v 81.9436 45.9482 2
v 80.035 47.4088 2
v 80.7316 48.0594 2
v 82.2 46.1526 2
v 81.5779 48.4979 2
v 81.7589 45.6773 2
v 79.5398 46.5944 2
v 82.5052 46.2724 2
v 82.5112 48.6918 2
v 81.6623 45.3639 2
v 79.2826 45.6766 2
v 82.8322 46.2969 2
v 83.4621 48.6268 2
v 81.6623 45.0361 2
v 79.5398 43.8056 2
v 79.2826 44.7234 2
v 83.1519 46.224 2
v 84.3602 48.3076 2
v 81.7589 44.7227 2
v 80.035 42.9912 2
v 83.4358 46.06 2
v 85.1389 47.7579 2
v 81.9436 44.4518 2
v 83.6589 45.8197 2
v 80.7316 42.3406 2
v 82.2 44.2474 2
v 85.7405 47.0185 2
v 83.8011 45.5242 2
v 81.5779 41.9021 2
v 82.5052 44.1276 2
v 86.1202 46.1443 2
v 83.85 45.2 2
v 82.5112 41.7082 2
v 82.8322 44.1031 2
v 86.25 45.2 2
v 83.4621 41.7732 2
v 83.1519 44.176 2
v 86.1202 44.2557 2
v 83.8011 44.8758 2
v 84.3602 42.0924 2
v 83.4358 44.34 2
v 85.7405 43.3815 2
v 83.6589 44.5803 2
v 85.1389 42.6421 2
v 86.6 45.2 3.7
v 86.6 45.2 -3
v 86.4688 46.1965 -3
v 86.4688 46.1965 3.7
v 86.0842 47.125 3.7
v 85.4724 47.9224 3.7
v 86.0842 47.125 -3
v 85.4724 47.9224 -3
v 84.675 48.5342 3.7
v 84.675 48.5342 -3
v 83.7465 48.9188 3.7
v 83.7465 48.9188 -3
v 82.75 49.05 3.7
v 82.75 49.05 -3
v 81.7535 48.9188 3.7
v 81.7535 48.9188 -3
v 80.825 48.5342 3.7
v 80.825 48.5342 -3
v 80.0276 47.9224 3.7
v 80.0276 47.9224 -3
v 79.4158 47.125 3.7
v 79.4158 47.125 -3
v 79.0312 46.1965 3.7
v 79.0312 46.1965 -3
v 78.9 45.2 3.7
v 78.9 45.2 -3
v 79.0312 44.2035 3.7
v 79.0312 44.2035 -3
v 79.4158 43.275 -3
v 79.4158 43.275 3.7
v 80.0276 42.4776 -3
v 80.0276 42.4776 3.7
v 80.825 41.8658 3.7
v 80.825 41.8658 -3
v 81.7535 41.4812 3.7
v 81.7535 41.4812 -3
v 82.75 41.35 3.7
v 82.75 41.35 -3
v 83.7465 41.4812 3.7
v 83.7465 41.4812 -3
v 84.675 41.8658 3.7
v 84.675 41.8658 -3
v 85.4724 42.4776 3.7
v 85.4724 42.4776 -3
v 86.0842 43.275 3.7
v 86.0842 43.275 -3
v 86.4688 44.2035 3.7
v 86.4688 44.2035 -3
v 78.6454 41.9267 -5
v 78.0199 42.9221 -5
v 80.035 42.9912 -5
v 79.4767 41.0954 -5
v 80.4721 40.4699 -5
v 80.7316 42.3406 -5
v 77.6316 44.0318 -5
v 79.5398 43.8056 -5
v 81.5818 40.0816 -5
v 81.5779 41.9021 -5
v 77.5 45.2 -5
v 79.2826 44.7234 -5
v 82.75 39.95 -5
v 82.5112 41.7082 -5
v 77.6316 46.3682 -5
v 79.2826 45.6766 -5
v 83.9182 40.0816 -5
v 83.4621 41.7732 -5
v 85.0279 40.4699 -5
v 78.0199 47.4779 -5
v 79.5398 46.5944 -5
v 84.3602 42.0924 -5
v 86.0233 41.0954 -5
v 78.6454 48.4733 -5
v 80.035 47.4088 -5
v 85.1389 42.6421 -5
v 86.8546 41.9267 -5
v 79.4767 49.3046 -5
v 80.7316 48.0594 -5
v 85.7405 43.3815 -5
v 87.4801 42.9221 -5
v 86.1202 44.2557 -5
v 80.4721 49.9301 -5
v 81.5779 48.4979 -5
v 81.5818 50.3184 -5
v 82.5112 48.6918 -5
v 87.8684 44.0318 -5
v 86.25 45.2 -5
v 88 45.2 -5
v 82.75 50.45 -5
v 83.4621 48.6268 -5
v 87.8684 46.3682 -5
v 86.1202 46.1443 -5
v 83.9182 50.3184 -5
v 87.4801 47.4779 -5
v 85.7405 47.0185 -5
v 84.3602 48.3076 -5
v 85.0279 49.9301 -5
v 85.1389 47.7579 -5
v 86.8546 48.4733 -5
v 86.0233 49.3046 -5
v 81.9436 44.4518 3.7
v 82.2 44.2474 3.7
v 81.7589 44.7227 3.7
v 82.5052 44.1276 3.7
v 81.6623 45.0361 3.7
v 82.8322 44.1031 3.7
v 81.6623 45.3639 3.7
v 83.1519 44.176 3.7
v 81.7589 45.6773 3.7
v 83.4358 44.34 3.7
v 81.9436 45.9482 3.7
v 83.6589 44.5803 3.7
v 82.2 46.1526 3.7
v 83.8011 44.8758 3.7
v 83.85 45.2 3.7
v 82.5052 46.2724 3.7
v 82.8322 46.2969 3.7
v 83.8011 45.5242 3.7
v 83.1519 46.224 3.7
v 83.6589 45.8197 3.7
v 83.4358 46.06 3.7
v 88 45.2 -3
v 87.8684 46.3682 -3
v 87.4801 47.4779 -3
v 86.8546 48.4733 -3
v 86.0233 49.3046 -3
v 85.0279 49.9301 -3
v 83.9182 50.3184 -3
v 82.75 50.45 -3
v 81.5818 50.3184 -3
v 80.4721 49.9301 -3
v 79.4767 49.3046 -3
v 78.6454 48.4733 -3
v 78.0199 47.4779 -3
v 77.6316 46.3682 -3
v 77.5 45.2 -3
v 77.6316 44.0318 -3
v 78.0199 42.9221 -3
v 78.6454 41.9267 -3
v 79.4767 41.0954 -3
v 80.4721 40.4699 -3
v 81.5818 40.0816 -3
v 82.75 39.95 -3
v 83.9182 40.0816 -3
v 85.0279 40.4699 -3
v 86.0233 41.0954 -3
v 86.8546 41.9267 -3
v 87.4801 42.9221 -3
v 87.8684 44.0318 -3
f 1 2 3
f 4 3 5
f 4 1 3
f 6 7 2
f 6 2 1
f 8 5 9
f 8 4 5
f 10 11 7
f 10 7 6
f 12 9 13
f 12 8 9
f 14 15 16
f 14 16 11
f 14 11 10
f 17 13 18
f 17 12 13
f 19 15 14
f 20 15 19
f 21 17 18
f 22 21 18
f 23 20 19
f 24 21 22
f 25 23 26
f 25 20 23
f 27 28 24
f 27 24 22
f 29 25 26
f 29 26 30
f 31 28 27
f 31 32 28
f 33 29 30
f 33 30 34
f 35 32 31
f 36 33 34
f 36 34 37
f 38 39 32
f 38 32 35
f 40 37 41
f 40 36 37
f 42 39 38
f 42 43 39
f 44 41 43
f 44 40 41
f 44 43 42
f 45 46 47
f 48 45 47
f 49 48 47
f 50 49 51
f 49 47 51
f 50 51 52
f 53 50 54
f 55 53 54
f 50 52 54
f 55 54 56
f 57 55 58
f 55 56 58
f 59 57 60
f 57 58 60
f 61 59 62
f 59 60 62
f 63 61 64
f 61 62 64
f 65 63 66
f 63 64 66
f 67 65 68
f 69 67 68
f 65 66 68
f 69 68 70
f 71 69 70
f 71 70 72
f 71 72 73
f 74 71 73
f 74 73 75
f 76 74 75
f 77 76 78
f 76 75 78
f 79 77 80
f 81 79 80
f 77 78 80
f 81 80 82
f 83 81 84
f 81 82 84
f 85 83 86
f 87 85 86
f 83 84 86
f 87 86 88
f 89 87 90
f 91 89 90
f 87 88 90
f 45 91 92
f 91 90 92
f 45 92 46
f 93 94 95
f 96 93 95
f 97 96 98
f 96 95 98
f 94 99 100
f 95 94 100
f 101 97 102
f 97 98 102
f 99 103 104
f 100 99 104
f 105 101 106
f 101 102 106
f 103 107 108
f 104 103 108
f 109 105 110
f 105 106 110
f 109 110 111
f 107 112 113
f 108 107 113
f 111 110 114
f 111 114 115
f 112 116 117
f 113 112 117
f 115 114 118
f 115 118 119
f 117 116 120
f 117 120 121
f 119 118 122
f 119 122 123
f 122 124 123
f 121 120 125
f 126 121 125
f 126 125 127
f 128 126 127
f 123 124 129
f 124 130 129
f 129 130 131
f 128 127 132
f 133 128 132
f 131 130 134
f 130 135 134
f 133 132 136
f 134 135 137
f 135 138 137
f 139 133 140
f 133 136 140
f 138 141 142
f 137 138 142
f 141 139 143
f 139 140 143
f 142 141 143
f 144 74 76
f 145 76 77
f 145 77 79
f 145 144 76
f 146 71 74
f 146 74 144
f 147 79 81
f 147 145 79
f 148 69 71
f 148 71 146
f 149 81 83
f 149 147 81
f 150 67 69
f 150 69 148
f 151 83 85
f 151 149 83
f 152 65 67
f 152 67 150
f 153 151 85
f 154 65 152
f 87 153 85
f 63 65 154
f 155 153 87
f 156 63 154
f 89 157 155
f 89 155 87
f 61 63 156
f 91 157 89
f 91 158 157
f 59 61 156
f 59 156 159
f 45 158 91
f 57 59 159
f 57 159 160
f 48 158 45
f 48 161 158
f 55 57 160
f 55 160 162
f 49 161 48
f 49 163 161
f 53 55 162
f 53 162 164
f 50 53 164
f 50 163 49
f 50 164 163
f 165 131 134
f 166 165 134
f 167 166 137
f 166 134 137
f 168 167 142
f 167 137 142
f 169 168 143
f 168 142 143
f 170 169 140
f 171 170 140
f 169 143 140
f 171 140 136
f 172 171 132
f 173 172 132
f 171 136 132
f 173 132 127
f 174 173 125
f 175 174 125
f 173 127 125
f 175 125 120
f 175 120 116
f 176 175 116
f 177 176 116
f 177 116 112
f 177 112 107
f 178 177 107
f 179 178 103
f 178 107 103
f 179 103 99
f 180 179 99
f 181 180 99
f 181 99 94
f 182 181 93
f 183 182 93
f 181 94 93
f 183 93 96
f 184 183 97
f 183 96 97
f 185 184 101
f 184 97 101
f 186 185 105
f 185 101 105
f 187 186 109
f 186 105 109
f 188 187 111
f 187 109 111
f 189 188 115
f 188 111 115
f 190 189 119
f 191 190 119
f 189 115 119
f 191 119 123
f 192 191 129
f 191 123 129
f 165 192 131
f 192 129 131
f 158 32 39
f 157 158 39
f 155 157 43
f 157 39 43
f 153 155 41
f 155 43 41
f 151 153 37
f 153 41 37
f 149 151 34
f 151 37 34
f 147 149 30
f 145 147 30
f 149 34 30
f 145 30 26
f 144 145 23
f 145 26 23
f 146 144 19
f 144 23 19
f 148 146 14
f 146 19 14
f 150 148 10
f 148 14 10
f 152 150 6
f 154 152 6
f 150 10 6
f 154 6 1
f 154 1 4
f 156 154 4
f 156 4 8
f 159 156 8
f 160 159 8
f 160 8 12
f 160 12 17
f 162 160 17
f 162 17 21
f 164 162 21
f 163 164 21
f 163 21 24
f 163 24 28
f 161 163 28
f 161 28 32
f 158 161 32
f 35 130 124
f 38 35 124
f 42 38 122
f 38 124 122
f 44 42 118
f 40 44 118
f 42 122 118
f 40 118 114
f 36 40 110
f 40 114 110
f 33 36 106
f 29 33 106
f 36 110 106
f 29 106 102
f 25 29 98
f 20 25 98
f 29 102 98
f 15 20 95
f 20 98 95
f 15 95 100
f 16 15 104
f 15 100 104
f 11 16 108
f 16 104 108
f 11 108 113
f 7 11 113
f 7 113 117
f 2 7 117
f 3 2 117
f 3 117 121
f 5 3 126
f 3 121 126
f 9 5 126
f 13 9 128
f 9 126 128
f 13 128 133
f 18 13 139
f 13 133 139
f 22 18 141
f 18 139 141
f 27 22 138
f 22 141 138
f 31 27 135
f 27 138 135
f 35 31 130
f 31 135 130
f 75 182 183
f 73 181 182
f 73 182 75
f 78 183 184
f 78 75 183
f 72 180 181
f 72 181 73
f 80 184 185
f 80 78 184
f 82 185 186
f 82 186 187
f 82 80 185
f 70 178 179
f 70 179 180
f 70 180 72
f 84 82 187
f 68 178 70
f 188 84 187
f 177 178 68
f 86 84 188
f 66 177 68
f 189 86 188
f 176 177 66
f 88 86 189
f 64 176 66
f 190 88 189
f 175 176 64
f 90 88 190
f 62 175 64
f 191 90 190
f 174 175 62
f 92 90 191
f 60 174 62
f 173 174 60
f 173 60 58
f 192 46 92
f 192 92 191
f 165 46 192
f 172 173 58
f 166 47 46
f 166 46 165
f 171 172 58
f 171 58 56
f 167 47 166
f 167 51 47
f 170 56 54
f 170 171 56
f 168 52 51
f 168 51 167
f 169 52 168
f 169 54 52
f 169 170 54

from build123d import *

# Parameters (mm, degrees)
SKETCH111_R     = 5.25
PAD063_DEPTH    = 2
SKETCH112_R     = 3.85
PAD064_DEPTH    = 6.7
SKETCH113_R     = 3.5
POCKET047_DEPTH = 7
SKETCH114_R     = 1.1
POCKET048_DEPTH = 5


with BuildPart() as part:
    # Sketch111 → Pad063 (new body)
    with BuildSketch(Plane.XY):
        Circle(SKETCH111_R)
    extrude(amount=PAD063_DEPTH)

    # Sketch112 (on Face3 of Pad063) → Pad064 (join)
    with BuildSketch(Plane.XY.offset(2)):
        Circle(SKETCH112_R)
    extrude(amount=PAD064_DEPTH)

    # Sketch113 (on Face2 of Pad064) → Pocket047 (cut)
    with BuildSketch(Plane(origin=(0, 0, 0), x_dir=(1, 0, 0), z_dir=(0, 0, -1))):
        Circle(SKETCH113_R)
    extrude(amount=-POCKET047_DEPTH, mode=Mode.SUBTRACT)

    # Sketch114 (on Face6 of Pocket047) → Pocket048 (cut)
    with BuildSketch(Plane(origin=(0, 0, 7), x_dir=(1, 0, 0), z_dir=(0, 0, -1))):
        Circle(SKETCH114_R)
    extrude(amount=-POCKET048_DEPTH, mode=Mode.SUBTRACT)


with BuildPart() as part_1:
    # Body022 placement: moved
    add(part.part.moved(Location((82.75, 45.2, -5))))


solid = part_1.part
